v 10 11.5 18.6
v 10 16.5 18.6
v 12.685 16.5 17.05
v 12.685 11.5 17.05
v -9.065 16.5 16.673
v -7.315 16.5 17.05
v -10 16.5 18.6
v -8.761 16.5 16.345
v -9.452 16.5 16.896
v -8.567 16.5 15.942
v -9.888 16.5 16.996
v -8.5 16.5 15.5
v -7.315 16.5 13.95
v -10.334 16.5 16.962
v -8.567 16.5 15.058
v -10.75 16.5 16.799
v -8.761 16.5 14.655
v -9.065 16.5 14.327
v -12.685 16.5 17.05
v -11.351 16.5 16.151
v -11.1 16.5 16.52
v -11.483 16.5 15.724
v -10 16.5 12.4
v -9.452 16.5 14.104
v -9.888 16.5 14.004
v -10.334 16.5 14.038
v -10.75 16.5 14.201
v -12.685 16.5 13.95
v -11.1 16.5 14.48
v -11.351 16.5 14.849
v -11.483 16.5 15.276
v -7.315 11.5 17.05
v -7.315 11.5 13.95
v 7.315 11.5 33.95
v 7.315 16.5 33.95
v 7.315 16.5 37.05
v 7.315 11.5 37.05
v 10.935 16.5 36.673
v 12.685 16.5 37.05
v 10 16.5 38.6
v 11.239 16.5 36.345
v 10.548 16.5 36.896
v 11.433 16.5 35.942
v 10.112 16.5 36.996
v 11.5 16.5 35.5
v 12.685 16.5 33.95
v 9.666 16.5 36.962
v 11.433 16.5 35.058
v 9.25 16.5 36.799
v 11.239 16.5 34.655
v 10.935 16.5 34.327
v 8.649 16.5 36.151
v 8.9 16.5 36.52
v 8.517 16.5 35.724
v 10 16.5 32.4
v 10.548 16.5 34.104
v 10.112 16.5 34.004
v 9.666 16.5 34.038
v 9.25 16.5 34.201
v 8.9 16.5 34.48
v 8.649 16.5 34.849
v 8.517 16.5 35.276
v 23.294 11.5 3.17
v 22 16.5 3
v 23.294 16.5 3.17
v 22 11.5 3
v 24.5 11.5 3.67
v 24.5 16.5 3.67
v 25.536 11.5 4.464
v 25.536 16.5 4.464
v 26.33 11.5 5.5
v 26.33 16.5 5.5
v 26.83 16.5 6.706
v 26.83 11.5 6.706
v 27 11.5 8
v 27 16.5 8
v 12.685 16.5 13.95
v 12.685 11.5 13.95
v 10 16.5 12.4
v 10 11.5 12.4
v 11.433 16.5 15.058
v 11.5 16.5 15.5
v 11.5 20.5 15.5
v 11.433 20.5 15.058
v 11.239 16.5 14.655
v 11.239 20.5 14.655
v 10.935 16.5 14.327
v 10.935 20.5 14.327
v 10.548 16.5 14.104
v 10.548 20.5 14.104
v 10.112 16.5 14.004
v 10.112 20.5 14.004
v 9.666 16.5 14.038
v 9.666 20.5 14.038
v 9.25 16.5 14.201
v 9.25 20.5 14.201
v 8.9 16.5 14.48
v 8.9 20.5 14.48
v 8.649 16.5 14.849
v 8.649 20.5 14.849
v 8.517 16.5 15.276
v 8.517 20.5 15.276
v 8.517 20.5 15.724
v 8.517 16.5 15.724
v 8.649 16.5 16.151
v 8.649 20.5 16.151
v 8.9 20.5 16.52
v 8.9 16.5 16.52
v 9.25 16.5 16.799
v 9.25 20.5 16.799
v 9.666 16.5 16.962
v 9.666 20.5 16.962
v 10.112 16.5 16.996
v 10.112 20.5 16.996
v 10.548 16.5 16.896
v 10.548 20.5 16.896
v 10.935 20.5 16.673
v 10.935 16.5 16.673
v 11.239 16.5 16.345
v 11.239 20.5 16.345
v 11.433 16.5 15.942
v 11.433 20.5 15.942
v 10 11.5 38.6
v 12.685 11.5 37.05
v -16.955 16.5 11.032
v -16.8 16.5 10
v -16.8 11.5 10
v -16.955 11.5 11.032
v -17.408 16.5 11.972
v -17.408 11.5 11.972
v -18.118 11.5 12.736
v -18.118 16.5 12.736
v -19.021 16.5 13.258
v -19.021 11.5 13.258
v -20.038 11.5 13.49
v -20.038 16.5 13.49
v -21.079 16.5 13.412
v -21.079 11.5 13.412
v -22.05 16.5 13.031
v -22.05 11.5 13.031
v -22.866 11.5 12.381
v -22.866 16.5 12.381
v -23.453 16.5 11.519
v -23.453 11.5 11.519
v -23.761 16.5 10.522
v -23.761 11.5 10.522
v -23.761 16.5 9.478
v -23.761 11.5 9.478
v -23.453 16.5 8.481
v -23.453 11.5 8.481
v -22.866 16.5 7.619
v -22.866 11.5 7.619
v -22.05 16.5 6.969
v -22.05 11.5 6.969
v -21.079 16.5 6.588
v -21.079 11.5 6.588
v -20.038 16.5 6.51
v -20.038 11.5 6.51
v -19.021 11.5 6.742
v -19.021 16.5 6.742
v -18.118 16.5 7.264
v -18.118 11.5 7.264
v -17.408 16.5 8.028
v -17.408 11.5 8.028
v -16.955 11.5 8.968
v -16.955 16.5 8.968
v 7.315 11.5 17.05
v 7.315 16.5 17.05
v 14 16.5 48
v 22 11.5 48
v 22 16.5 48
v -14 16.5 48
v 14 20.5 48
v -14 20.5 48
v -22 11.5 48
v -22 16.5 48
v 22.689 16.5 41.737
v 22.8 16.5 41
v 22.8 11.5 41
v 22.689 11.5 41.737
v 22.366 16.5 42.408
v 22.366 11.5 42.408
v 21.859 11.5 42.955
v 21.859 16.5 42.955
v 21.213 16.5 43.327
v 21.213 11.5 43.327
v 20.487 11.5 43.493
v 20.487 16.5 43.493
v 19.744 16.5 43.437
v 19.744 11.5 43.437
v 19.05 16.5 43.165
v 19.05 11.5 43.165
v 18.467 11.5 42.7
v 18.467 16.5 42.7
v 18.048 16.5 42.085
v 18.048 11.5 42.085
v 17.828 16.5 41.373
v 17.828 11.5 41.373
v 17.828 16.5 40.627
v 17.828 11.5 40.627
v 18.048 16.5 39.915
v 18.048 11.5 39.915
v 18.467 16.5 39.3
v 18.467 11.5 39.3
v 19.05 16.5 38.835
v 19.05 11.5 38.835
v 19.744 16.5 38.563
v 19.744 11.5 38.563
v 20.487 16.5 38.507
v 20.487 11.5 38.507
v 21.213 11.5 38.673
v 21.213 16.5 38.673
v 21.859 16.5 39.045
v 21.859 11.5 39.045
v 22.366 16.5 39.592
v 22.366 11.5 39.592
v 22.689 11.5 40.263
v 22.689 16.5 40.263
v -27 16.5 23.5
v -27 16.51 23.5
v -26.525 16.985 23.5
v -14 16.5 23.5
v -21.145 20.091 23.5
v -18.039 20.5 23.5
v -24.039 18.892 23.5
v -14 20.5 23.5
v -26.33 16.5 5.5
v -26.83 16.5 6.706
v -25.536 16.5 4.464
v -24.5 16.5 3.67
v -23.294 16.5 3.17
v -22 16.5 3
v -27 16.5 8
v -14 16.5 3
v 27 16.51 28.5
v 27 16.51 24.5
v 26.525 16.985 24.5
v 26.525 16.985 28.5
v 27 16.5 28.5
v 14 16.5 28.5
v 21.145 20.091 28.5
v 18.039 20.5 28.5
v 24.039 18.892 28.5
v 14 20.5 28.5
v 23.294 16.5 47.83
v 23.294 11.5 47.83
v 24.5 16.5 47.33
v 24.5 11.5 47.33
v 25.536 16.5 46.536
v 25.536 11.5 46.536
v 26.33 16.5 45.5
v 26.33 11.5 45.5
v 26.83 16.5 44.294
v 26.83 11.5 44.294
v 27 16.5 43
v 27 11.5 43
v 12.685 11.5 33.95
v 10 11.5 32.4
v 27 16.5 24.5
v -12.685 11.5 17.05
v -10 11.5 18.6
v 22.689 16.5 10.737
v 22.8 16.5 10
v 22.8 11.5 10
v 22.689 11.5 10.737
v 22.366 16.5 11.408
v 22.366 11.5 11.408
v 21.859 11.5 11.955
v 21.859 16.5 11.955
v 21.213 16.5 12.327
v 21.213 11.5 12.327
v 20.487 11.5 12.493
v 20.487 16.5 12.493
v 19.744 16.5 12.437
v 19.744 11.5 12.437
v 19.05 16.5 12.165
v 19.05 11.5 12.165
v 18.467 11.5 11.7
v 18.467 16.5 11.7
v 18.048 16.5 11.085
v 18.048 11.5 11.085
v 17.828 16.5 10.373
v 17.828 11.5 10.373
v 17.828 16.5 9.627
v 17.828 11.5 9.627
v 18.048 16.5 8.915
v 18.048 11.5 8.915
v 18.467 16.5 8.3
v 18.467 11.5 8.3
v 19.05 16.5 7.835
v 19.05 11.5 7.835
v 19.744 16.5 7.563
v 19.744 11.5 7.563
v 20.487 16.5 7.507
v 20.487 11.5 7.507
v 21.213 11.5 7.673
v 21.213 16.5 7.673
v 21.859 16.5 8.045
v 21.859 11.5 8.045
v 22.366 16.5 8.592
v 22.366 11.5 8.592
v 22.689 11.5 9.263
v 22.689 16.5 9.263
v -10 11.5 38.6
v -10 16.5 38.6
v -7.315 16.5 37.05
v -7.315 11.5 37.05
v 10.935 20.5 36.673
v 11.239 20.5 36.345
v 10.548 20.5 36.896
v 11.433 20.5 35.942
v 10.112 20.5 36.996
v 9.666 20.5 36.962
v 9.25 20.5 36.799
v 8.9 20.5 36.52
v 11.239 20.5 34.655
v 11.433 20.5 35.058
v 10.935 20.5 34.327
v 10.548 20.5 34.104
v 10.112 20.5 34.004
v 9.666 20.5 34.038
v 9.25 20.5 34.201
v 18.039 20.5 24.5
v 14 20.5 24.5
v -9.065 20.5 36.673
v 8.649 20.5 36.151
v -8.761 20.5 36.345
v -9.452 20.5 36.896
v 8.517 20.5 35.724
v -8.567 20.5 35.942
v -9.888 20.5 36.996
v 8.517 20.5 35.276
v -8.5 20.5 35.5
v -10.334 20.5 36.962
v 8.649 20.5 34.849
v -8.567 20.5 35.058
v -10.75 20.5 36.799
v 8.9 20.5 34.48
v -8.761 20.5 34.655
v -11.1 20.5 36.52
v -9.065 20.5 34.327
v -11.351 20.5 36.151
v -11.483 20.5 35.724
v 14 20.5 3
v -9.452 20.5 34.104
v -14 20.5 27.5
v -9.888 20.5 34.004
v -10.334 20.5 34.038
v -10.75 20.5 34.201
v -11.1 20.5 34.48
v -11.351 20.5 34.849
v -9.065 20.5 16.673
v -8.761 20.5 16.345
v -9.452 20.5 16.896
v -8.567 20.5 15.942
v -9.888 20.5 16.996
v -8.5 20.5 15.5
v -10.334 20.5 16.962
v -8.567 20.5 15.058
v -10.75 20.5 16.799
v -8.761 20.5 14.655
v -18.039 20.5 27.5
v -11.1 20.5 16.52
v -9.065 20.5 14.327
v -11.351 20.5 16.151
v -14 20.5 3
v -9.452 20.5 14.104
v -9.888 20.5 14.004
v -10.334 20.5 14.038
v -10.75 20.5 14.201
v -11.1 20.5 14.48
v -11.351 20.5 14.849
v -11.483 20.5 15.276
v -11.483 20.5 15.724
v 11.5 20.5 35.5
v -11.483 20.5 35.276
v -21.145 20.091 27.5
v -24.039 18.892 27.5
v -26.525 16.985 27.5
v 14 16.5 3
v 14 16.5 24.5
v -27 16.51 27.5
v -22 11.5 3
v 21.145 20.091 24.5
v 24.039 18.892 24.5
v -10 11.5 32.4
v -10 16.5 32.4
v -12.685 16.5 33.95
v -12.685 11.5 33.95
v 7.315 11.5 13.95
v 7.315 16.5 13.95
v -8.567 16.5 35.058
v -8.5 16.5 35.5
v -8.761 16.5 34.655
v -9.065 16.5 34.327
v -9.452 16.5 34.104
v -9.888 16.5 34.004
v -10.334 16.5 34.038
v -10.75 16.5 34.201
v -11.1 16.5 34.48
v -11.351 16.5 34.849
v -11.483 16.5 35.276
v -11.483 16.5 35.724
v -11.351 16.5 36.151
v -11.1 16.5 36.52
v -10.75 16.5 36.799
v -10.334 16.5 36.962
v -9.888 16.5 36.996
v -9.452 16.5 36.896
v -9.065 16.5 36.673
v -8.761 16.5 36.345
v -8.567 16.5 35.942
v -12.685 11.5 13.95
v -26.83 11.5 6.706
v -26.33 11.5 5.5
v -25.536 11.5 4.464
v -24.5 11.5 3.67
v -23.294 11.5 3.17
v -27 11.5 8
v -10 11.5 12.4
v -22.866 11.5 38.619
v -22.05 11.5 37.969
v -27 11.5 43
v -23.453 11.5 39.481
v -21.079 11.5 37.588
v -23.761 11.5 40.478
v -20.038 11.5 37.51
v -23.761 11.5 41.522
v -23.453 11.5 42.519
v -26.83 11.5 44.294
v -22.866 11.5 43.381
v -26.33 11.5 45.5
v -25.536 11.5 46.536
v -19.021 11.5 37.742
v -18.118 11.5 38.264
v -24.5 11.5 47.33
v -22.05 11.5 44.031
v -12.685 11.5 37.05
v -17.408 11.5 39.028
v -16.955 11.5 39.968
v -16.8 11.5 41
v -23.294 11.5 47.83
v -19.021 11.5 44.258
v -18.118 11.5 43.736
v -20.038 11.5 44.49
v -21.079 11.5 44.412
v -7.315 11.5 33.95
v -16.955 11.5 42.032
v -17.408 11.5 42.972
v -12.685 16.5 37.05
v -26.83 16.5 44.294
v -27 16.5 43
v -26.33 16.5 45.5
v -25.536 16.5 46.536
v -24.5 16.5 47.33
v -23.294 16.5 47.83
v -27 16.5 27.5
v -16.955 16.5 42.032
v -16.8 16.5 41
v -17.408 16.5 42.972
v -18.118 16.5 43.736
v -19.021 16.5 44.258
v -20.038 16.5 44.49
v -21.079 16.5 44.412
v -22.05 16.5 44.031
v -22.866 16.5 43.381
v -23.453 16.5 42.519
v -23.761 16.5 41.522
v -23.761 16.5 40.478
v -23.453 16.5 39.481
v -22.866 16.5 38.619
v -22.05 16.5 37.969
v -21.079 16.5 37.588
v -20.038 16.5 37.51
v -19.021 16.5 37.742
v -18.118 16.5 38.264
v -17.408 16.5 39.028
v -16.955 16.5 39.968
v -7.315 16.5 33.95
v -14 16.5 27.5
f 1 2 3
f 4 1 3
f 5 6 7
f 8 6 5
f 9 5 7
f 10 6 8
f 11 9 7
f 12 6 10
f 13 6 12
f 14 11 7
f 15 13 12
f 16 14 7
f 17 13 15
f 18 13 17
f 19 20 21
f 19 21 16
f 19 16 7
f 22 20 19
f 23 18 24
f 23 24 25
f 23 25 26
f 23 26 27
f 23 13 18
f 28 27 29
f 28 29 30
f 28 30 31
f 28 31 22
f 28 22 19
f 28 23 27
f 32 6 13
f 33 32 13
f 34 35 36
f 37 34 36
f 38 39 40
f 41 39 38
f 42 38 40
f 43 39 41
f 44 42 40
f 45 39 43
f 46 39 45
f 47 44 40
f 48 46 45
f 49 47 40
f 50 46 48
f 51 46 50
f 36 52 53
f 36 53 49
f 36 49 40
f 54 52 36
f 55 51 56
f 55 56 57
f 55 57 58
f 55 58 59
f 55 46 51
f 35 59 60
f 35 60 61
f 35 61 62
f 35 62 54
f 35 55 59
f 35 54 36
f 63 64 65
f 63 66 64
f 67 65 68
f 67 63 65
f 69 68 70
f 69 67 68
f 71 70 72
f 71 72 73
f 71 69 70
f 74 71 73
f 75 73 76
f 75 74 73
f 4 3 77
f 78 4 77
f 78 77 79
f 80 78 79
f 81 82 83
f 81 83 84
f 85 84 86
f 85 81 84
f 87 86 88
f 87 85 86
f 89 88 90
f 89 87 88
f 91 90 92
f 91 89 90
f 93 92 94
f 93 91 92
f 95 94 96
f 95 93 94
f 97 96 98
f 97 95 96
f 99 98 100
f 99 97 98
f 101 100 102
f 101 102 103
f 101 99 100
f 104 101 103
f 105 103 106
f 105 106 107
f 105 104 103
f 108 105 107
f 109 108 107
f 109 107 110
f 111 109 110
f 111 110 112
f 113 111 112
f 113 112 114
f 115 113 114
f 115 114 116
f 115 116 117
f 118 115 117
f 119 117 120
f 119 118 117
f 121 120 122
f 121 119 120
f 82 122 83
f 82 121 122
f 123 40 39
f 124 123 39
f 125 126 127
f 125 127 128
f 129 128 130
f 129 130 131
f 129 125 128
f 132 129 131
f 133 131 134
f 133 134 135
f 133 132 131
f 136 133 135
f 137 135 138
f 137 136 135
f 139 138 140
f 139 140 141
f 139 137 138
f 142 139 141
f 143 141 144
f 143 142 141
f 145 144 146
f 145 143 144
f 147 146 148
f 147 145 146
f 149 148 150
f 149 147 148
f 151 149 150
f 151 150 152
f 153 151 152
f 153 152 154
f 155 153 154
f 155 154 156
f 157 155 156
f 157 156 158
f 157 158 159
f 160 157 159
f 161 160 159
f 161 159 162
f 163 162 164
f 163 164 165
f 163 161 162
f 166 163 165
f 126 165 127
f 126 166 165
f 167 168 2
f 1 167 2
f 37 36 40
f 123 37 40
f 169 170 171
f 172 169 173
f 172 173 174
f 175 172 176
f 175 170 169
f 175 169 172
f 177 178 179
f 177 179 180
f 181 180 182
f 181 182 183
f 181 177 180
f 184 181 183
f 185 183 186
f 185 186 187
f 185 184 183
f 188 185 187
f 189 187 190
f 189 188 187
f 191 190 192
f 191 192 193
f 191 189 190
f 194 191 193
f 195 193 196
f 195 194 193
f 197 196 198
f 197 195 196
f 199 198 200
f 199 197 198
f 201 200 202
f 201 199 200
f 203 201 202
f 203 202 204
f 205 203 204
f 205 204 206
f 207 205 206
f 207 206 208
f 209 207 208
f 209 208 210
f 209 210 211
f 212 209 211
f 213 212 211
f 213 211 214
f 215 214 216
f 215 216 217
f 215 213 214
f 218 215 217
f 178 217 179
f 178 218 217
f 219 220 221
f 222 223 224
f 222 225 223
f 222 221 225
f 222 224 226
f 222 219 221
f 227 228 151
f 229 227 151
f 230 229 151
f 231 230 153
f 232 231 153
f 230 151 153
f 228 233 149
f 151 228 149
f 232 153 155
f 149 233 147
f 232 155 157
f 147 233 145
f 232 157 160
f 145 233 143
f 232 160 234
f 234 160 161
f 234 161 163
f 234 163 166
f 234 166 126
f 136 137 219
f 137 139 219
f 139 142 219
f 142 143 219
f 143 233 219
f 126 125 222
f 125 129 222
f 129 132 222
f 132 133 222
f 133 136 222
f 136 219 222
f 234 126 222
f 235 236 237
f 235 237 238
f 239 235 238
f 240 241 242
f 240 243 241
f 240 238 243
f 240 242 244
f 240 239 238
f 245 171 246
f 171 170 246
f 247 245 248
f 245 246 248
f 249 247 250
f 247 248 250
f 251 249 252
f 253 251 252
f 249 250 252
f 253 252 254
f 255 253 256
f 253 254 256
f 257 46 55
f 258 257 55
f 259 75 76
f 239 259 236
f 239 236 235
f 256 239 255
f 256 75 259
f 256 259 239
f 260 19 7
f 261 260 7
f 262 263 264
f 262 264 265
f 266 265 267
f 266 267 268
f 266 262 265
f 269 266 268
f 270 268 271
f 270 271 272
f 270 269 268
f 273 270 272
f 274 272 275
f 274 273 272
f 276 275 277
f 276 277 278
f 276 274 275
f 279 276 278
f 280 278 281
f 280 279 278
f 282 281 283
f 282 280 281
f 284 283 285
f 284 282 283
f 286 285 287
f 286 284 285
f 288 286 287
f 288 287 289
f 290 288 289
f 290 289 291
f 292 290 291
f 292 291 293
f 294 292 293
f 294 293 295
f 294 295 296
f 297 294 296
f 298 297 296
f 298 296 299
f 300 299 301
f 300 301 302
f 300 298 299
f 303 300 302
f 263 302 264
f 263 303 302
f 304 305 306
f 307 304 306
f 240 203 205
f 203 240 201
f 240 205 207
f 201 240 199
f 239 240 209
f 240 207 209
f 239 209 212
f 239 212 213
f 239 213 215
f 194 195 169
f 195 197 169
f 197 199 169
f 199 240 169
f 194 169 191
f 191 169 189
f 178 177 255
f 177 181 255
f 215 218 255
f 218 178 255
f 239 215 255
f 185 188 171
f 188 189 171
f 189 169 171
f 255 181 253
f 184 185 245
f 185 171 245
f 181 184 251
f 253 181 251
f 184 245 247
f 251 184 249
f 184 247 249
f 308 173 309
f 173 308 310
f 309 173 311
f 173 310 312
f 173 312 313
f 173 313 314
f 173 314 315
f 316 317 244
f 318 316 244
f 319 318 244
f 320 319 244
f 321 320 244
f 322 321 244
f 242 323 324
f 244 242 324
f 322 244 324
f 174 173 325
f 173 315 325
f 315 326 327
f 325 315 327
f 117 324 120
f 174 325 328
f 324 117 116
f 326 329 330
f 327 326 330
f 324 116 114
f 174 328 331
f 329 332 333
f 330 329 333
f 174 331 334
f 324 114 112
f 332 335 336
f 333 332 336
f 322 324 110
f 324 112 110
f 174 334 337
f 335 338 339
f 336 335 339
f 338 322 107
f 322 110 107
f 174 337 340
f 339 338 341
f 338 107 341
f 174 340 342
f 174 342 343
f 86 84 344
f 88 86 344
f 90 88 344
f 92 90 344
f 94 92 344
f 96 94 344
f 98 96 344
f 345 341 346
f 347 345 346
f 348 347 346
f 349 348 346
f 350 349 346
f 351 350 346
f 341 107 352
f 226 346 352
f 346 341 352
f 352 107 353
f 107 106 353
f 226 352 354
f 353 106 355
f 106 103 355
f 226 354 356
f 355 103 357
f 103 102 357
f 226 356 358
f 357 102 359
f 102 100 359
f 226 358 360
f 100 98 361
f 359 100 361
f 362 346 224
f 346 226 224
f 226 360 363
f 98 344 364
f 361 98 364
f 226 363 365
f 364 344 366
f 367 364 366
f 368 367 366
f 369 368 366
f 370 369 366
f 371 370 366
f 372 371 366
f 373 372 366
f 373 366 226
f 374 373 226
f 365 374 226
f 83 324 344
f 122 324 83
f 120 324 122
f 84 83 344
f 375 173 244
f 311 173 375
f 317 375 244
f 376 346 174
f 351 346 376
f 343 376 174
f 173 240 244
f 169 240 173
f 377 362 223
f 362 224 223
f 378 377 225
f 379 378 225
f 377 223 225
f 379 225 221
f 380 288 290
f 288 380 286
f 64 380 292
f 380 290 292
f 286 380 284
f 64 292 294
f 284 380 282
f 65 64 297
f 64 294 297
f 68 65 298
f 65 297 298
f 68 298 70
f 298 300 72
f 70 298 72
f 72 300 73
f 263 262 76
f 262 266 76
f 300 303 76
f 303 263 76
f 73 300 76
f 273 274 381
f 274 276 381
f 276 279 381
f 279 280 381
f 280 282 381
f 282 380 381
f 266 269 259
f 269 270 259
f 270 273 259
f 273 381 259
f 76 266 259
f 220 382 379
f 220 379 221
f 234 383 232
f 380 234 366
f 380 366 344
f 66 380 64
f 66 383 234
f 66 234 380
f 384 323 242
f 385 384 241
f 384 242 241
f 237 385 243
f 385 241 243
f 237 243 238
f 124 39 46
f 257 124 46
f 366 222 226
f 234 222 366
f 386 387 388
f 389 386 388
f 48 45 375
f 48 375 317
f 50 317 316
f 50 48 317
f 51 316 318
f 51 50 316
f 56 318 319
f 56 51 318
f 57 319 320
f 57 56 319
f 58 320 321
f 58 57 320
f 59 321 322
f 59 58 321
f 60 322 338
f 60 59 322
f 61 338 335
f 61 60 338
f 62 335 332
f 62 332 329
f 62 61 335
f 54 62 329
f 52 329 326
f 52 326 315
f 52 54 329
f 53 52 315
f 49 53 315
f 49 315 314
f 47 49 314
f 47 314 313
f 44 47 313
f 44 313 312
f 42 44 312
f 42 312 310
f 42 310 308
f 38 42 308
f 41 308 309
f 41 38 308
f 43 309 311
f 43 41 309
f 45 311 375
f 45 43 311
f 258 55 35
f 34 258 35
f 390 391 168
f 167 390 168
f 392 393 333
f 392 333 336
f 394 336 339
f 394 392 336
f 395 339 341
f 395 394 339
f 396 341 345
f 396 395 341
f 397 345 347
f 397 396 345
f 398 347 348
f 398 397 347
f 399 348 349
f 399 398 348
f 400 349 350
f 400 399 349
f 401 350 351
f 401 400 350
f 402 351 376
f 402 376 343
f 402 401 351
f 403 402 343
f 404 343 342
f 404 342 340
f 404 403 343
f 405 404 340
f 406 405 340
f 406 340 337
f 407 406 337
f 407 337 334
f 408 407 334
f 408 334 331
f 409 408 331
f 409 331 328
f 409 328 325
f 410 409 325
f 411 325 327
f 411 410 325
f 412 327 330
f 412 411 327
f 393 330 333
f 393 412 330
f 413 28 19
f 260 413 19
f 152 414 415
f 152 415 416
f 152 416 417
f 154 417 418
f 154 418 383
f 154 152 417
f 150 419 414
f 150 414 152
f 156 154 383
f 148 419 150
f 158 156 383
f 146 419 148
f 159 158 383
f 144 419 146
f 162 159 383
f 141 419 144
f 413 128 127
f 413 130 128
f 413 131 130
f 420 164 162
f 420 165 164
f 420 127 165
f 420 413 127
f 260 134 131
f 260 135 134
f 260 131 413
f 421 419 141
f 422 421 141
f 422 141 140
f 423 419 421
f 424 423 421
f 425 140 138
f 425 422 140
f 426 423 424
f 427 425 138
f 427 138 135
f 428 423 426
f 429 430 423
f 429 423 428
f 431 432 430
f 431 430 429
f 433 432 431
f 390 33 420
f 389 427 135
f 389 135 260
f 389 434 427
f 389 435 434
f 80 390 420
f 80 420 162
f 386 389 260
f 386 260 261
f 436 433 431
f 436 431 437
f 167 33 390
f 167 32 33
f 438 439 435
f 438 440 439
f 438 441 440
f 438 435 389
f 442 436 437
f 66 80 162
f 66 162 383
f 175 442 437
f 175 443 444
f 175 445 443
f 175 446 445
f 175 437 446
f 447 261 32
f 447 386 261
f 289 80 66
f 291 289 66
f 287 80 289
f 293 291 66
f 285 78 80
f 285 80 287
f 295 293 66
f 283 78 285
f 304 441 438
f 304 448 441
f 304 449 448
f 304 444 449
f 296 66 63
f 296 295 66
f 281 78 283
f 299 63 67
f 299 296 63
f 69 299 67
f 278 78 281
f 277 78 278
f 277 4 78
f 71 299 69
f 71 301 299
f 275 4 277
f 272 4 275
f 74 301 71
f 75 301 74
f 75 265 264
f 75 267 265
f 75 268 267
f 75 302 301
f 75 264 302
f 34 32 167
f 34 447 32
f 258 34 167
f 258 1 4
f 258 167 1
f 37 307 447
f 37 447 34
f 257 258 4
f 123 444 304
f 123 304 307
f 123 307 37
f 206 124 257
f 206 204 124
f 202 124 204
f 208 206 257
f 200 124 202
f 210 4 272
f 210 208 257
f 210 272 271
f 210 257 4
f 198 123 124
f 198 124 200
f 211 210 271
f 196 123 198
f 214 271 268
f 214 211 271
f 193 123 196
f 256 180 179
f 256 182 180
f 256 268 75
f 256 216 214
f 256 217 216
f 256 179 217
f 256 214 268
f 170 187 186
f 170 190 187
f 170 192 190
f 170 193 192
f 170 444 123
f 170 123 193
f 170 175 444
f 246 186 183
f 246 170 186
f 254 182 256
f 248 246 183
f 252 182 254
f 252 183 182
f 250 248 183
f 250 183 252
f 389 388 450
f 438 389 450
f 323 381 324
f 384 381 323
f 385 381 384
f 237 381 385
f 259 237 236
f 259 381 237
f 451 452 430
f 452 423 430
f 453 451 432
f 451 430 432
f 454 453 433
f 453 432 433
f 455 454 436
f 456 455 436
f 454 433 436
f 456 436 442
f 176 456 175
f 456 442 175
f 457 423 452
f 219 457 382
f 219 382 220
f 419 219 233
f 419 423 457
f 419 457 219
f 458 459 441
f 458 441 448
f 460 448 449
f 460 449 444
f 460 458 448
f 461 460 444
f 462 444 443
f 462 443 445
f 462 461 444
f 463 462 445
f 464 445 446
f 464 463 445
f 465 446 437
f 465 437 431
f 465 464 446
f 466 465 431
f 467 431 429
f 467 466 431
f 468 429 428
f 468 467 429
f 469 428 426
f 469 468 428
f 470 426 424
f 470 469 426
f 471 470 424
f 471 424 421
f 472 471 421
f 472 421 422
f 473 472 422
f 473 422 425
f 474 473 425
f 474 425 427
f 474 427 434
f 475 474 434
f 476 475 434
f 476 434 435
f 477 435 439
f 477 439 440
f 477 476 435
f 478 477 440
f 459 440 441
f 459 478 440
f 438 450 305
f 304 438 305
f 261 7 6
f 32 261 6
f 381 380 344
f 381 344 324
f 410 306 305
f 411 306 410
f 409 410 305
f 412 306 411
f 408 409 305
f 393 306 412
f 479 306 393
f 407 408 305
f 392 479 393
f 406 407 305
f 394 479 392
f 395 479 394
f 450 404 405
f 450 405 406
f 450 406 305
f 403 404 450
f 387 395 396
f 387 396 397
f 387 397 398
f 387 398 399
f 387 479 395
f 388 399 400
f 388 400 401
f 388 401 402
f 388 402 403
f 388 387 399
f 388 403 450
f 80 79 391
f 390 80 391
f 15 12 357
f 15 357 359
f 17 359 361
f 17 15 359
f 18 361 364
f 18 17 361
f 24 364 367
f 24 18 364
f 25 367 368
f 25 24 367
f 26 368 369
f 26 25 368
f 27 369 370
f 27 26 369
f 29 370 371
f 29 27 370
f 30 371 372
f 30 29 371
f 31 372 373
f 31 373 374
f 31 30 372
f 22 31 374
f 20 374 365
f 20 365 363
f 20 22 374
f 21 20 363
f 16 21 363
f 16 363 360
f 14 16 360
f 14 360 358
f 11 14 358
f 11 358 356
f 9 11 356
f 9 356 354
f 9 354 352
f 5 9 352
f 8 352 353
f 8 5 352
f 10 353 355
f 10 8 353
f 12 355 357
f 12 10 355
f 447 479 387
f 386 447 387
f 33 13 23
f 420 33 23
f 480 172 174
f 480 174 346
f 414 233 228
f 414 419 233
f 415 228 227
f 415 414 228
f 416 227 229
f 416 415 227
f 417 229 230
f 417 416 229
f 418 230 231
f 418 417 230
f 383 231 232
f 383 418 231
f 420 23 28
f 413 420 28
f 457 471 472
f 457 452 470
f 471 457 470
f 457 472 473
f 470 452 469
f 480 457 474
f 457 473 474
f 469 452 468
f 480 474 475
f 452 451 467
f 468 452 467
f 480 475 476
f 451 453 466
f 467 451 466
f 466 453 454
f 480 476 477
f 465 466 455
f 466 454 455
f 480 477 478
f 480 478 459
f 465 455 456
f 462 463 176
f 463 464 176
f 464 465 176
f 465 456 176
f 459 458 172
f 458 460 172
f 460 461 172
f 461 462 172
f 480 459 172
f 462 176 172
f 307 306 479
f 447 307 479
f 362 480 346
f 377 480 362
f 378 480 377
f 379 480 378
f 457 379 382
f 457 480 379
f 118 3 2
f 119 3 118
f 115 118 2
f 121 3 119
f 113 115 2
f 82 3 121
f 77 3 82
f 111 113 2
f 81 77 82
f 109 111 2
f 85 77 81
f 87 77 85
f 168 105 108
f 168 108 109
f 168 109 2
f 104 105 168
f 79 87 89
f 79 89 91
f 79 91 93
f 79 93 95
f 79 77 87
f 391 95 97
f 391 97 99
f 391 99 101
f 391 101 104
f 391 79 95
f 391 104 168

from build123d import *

# Parameters (mm, degrees)
SKETCH005_W   = 54
SKETCH005_H   = 45
SKETCH005_R   = 3.5
SKETCH005_R_2 = 2.5
PAD001_DEPTH  = 5
FILLET_R      = 5
POCKET_DEPTH  = 5
SKETCH007_R   = 1.5
PAD002_DEPTH  = 4
CHAMFER_SIZE  = 3.99
FILLET001_R   = 12


with BuildPart() as part:
    # Sketch005 → Pad001 (new body)
    with BuildSketch(Plane.XZ):
        with Locations((0, 25.5)):
            Rectangle(SKETCH005_W, SKETCH005_H)
        with Locations((-20.3, 41)):
            Circle(SKETCH005_R, mode=Mode.SUBTRACT)
        with Locations((-20.3, 10)):
            Circle(SKETCH005_R, mode=Mode.SUBTRACT)
        with Locations((20.3, 10)):
            Circle(SKETCH005_R_2, mode=Mode.SUBTRACT)
        with Locations((20.3, 41)):
            Circle(SKETCH005_R_2, mode=Mode.SUBTRACT)
    extrude(amount=PAD001_DEPTH)

    # Fillet
    fillet_edges = [part.edges().sort_by_distance(p)[0] for p in [
        (-27, -2.5, 48),
        (-27, -2.5, 3),
        (27, -2.5, 48),
        (27, -2.5, 3),
    ]]
    fillet(fillet_edges, radius=FILLET_R)

    # Sketch006 (on Face2 of Fillet) → Pocket (cut)
    with BuildSketch(Plane(origin=(0, 0, 0), x_dir=(1, 0, 0), z_dir=(0, 1, 0))):
        Polygon((-7.315321, -17.05), (-7.315321, -13.95), (-10, -12.4), (-12.684679, -13.95), (-12.684679, -17.05), (-10, -18.6), align=None)
        Polygon((-7.315321, -33.95), (-10, -32.4), (-12.684679, -33.95), (-12.684679, -37.05), (-10, -38.6), (-7.315321, -37.05), align=None)
        Polygon((12.684679, -37.05), (12.684679, -33.95), (10, -32.4), (7.315321, -33.95), (7.315321, -37.05), (10, -38.6), align=None)
        Polygon((12.684679, -17.05), (12.684679, -13.95), (10, -12.4), (7.315321, -13.95), (7.315321, -17.05), (10, -18.6), align=None)
    extrude(amount=-POCKET_DEPTH, mode=Mode.SUBTRACT)

    # Sketch007 (on Face2 of Pocket) → Pad002 (join)
    with BuildSketch(Plane(origin=(0, 0, 0), x_dir=(1, 0, 0), z_dir=(0, 1, 0))):
        Polygon((-14, -3), (14, -3), (14, -24.5), (27, -24.5), (27, -28.5), (14, -28.5), (14, -48), (-14, -48), (-14, -27.5), (-27, -27.5), (-27, -23.5), (-14, -23.5), align=None)
        with Locations((-10, -15.5)):
            Circle(SKETCH007_R, mode=Mode.SUBTRACT)
        with Locations((10, -15.5)):
            Circle(SKETCH007_R, mode=Mode.SUBTRACT)
        with Locations((-10, -35.5)):
            Circle(SKETCH007_R, mode=Mode.SUBTRACT)
        with Locations((10, -35.5)):
            Circle(SKETCH007_R, mode=Mode.SUBTRACT)
    extrude(amount=PAD002_DEPTH)

    # Chamfer
    chamfer_edges = [part.edges().sort_by_distance(p)[0] for p in [
        (27, 4, 26.5),
        (-27, 4, 25.5),
    ]]
    chamfer(chamfer_edges, length=CHAMFER_SIZE)

    # Fillet001
    fillet001_edges = [part.edges().sort_by_distance(p)[0] for p in [
        (23.01, 4, 26.5),
        (-23.01, 4, 25.5),
    ]]
    fillet(fillet001_edges, radius=FILLET001_R)


with BuildPart() as part_1:
    # Body005 placement: moved
    add(part.part.moved(Location((0, 16.5, 0))))


solid = part_1.part
